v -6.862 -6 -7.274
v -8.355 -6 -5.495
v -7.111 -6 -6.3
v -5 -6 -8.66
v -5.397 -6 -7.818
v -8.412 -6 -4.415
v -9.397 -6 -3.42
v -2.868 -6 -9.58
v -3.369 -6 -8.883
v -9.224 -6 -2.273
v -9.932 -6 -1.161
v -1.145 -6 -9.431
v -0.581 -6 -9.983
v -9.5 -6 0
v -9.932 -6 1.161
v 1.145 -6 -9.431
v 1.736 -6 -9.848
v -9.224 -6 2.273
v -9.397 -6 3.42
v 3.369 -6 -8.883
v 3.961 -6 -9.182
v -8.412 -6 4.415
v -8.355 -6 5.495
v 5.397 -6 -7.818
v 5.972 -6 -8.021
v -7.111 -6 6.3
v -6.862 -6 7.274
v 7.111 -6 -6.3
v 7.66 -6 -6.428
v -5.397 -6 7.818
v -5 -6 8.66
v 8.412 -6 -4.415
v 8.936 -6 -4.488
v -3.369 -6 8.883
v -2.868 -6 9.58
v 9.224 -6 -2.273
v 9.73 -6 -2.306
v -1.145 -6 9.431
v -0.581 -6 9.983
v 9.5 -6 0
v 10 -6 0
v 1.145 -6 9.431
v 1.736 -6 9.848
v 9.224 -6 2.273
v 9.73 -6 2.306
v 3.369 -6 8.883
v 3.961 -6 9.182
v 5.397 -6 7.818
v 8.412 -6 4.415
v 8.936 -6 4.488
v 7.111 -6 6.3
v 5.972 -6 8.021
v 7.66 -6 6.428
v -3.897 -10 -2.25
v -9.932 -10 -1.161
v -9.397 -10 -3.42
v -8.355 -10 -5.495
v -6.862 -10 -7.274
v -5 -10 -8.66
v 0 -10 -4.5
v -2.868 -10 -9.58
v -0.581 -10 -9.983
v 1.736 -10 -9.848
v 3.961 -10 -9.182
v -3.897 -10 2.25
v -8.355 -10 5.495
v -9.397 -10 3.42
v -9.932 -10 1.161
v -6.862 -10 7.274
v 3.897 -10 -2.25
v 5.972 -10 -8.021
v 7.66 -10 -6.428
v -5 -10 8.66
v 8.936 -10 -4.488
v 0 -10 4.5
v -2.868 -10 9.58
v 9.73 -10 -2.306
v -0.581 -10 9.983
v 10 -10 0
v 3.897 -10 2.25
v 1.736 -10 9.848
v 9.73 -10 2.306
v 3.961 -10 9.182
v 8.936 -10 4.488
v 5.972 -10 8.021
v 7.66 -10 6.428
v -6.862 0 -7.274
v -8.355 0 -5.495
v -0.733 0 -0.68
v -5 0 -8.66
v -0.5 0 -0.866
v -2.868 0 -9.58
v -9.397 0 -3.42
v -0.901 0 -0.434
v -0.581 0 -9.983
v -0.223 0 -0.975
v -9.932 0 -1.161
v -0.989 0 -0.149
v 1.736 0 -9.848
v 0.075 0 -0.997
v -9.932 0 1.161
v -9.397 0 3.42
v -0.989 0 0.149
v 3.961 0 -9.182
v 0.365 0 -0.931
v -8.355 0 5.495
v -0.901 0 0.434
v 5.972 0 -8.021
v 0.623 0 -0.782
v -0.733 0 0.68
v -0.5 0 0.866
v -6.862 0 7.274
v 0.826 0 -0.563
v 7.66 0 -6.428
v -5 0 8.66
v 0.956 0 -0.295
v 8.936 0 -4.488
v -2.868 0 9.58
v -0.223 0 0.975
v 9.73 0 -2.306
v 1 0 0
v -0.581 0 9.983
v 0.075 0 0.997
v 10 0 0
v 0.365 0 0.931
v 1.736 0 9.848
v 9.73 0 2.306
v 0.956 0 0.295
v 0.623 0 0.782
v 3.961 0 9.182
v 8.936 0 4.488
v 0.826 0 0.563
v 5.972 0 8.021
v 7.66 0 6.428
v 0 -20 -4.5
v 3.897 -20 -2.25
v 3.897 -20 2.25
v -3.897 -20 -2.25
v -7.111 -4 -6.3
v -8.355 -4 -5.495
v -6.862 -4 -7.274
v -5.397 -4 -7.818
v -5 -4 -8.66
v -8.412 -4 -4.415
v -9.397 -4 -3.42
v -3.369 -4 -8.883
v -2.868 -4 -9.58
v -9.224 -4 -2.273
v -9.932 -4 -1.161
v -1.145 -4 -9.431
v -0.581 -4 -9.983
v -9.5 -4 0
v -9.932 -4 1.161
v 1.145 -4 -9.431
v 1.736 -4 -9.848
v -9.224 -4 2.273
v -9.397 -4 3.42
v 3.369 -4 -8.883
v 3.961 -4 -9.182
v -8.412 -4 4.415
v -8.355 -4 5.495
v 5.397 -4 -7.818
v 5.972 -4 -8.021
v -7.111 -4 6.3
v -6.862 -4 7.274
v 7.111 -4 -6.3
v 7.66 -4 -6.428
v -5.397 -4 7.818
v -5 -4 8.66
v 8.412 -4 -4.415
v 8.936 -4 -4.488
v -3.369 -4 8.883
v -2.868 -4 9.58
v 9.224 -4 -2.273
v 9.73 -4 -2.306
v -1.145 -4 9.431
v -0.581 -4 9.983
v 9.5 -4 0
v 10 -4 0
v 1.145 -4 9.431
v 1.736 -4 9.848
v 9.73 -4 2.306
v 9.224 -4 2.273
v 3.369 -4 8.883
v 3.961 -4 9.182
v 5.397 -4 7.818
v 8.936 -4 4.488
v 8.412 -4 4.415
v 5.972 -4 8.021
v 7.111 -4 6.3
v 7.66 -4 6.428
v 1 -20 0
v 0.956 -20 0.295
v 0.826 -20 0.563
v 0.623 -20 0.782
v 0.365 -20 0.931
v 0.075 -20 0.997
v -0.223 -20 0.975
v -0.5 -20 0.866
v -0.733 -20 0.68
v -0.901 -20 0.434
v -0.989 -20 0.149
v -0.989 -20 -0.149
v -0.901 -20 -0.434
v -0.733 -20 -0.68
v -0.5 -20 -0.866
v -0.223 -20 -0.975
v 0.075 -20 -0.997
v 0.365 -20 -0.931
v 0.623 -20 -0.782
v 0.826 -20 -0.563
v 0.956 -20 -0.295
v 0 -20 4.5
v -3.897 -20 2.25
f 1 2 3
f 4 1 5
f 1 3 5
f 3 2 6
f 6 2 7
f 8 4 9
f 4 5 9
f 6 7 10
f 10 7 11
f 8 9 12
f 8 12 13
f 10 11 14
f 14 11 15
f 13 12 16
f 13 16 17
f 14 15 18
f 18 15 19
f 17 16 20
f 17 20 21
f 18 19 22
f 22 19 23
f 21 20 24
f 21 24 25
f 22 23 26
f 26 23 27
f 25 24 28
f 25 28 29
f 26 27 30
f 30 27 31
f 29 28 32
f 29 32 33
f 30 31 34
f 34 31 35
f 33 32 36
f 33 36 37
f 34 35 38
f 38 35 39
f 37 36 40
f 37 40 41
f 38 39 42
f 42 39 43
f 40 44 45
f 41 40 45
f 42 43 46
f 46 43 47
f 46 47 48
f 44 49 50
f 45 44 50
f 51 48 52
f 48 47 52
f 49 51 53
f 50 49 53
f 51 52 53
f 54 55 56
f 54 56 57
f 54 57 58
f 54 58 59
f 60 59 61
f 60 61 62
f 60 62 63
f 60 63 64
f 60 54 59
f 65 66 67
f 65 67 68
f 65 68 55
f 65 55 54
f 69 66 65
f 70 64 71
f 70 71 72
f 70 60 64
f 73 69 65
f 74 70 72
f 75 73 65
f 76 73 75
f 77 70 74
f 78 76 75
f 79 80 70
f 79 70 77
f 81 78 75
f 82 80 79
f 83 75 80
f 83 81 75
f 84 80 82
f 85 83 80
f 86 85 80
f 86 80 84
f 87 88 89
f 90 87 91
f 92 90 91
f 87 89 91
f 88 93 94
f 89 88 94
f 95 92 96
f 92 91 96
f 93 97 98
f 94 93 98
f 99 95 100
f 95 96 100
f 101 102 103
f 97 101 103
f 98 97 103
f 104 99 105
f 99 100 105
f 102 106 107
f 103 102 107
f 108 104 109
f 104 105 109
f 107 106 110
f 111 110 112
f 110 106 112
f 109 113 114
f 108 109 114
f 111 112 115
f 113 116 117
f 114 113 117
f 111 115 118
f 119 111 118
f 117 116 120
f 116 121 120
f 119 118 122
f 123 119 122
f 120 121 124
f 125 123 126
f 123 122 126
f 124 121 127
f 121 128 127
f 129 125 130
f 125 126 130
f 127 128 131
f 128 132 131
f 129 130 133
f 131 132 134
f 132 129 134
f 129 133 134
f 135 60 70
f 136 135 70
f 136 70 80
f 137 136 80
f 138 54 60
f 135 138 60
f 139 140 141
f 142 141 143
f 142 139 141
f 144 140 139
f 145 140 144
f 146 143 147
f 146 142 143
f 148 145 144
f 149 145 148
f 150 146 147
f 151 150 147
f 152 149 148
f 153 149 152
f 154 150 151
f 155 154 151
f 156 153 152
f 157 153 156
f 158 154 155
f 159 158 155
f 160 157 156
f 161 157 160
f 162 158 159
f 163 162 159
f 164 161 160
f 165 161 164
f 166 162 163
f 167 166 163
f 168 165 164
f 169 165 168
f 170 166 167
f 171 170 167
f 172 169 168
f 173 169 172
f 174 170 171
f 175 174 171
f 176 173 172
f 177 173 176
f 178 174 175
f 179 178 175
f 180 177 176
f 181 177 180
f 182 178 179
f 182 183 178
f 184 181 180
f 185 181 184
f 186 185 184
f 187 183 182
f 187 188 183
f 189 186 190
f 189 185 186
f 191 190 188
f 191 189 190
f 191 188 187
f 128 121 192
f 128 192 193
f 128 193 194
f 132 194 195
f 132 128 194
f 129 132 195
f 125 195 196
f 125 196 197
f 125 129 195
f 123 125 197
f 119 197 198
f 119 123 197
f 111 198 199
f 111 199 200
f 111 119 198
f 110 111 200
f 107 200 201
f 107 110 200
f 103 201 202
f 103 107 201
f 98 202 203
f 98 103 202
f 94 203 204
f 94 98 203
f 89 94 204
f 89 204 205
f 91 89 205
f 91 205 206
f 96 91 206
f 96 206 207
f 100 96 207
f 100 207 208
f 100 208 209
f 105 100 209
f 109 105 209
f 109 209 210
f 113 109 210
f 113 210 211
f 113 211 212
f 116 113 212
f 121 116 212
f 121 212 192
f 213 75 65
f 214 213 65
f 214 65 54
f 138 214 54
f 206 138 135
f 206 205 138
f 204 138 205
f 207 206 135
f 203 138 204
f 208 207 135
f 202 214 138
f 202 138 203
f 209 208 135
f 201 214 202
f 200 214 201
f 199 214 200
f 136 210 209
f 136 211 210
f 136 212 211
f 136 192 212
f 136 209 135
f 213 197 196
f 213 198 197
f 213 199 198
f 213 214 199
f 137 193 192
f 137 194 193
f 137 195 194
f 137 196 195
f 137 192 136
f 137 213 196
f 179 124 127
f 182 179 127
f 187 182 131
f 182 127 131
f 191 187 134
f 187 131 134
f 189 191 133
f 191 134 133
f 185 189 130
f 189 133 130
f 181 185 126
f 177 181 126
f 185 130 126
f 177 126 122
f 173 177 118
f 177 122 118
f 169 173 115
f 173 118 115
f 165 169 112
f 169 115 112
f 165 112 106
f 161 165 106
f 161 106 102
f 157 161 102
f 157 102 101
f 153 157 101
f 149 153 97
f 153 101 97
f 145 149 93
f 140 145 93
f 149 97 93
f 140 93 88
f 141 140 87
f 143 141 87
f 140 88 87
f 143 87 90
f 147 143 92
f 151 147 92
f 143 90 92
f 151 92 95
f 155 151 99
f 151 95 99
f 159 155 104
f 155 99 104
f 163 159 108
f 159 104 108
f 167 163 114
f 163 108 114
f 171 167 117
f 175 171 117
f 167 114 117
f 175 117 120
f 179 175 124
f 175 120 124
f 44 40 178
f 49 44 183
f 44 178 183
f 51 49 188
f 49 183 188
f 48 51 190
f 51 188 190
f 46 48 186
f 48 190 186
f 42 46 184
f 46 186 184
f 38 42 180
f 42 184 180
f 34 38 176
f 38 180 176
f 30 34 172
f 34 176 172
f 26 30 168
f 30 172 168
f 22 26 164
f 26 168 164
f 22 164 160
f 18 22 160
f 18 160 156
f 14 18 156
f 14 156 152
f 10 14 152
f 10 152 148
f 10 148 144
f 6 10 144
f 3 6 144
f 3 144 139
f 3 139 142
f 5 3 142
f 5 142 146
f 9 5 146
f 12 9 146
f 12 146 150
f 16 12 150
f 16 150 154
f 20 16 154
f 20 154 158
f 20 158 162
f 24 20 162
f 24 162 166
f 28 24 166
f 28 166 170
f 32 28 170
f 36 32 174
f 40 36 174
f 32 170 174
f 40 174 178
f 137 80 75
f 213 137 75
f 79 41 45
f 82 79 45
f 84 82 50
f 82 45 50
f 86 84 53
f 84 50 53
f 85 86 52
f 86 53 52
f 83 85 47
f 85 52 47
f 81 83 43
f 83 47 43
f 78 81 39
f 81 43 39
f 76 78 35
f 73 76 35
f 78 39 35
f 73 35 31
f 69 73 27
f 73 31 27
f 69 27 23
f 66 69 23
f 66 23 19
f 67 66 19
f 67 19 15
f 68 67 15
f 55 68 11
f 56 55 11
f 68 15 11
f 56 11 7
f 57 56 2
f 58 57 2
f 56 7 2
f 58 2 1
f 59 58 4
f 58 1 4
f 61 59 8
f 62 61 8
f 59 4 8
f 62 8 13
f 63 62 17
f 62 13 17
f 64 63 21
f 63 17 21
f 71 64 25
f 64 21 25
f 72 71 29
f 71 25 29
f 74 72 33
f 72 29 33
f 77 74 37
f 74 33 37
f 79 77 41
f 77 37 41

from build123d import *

# Parameters (mm, degrees)
F0_R     = 10
F0_R_2   = 9.5
F0_R_3   = 1
F1_DEPTH = 4
F2_DEPTH = 6
F3_R     = 10
F3_R_2   = 9.5
F3_R_3   = 1
F4_DEPTH = 4
F5_DEPTH = 14
F6_DEPTH = 20


with BuildPart() as f1:
    # F0 (on Front) → F1 (new body)
    with BuildSketch(Plane.XZ):
        Circle(F0_R)
        Circle(F0_R_2, mode=Mode.SUBTRACT)
        Circle(F0_R_2)
        with BuildLine():
            ThreePointArc((3.897114317, 2.25), (4.3466662183, 1.164685703), (4.5, 0))
            ThreePointArc((4.5, 0), (4.3466662183, -1.164685703), (3.897114317, -2.25))
            ThreePointArc((3.897114317, -2.25), (2.25, -3.897114317), (0, -4.5))
            ThreePointArc((0, -4.5), (-2.25, -3.897114317), (-3.897114317, -2.25))
            ThreePointArc((-3.897114317, -2.25), (-4.5, 0), (-3.897114317, 2.25))
            ThreePointArc((-3.897114317, 2.25), (-2.25, 3.897114317), (0, 4.5))
            ThreePointArc((0, 4.5), (2.25, 3.897114317), (3.897114317, 2.25))
        make_face(mode=Mode.SUBTRACT)
        with BuildLine():
            Line((0, 4.5), (3.897114317, 2.25))
            ThreePointArc((3.897114317, 2.25), (2.25, 3.897114317), (0, 4.5))
        make_face()
        with BuildLine():
            Line((-3.897114317, 2.25), (0, 4.5))
            ThreePointArc((0, 4.5), (-2.25, 3.897114317), (-3.897114317, 2.25))
        make_face()
        with BuildLine():
            Line((-3.897114317, -2.25), (-3.897114317, 2.25))
            ThreePointArc((-3.897114317, 2.25), (-4.5, 0), (-3.897114317, -2.25))
        make_face()
        with BuildLine():
            ThreePointArc((-3.897114317, -2.25), (-2.25, -3.897114317), (0, -4.5))
            Line((0, -4.5), (-3.897114317, -2.25))
        make_face()
        with BuildLine():
            ThreePointArc((0, -4.5), (2.25, -3.897114317), (3.897114317, -2.25))
            Line((3.897114317, -2.25), (0, -4.5))
        make_face()
        Polygon((3.897114317, -2.25), (3.897114317, 2.25), (0, 4.5), (-3.897114317, 2.25), (-3.897114317, -2.25), (0, -4.5), align=None)
        Circle(F0_R_3, mode=Mode.SUBTRACT)
        with BuildLine():
            ThreePointArc((3.897114317, -2.25), (4.3466662183, -1.164685703), (4.5, 0))
            ThreePointArc((4.5, 0), (4.3466662183, 1.164685703), (3.897114317, 2.25))
            Line((3.897114317, 2.25), (3.897114317, -2.25))
        make_face()
    extrude(amount=F1_DEPTH)

    # F0 (on Front) → F2 (join)
    with BuildSketch(Plane.XZ):
        Circle(F0_R_2)
        with BuildLine():
            ThreePointArc((3.897114317, 2.25), (4.3466662183, 1.164685703), (4.5, 0))
            ThreePointArc((4.5, 0), (4.3466662183, -1.164685703), (3.897114317, -2.25))
            ThreePointArc((3.897114317, -2.25), (2.25, -3.897114317), (0, -4.5))
            ThreePointArc((0, -4.5), (-2.25, -3.897114317), (-3.897114317, -2.25))
            ThreePointArc((-3.897114317, -2.25), (-4.5, 0), (-3.897114317, 2.25))
            ThreePointArc((-3.897114317, 2.25), (-2.25, 3.897114317), (0, 4.5))
            ThreePointArc((0, 4.5), (2.25, 3.897114317), (3.897114317, 2.25))
        make_face(mode=Mode.SUBTRACT)
        Polygon((3.897114317, -2.25), (3.897114317, 2.25), (0, 4.5), (-3.897114317, 2.25), (-3.897114317, -2.25), (0, -4.5), align=None)
        Circle(F0_R_3, mode=Mode.SUBTRACT)
        with BuildLine():
            Line((-3.897114317, 2.25), (0, 4.5))
            ThreePointArc((0, 4.5), (-2.25, 3.897114317), (-3.897114317, 2.25))
        make_face()
        with BuildLine():
            Line((0, 4.5), (3.897114317, 2.25))
            ThreePointArc((3.897114317, 2.25), (2.25, 3.897114317), (0, 4.5))
        make_face()
        with BuildLine():
            ThreePointArc((3.897114317, -2.25), (4.3466662183, -1.164685703), (4.5, 0))
            ThreePointArc((4.5, 0), (4.3466662183, 1.164685703), (3.897114317, 2.25))
            Line((3.897114317, 2.25), (3.897114317, -2.25))
        make_face()
        with BuildLine():
            Line((-3.897114317, -2.25), (-3.897114317, 2.25))
            ThreePointArc((-3.897114317, 2.25), (-4.5, 0), (-3.897114317, -2.25))
        make_face()
        with BuildLine():
            ThreePointArc((-3.897114317, -2.25), (-2.25, -3.897114317), (0, -4.5))
            Line((0, -4.5), (-3.897114317, -2.25))
        make_face()
        with BuildLine():
            ThreePointArc((0, -4.5), (2.25, -3.897114317), (3.897114317, -2.25))
            Line((3.897114317, -2.25), (0, -4.5))
        make_face()
    extrude(amount=F2_DEPTH)



with BuildPart() as f4:
    # F3 (on face) → F4 (new body)
    with BuildSketch(Plane.XZ.offset(6)):
        Circle(F3_R)
        Circle(F3_R_2, mode=Mode.SUBTRACT)
        Circle(F3_R_2)
        with BuildLine():
            ThreePointArc((3.897114317, 2.25), (4.3466662183, 1.164685703), (4.5, 0))
            ThreePointArc((4.5, 0), (4.3466662183, -1.164685703), (3.897114317, -2.25))
            ThreePointArc((3.897114317, -2.25), (2.25, -3.897114317), (0, -4.5))
            ThreePointArc((0, -4.5), (-2.25, -3.897114317), (-3.897114317, -2.25))
            ThreePointArc((-3.897114317, -2.25), (-4.5, 0), (-3.897114317, 2.25))
            ThreePointArc((-3.897114317, 2.25), (-2.25, 3.897114317), (0, 4.5))
            ThreePointArc((0, 4.5), (2.25, 3.897114317), (3.897114317, 2.25))
        make_face(mode=Mode.SUBTRACT)
        with BuildLine():
            Line((-3.897114317, 2.25), (0, 4.5))
            ThreePointArc((0, 4.5), (-2.25, 3.897114317), (-3.897114317, 2.25))
        make_face()
        with BuildLine():
            Line((-3.897114317, -2.25), (-3.897114317, 2.25))
            ThreePointArc((-3.897114317, 2.25), (-4.5, 0), (-3.897114317, -2.25))
        make_face()
        with BuildLine():
            Line((0, 4.5), (3.897114317, 2.25))
            ThreePointArc((3.897114317, 2.25), (2.25, 3.897114317), (0, 4.5))
        make_face()
        Polygon((3.897114317, -2.25), (3.897114317, 2.25), (0, 4.5), (-3.897114317, 2.25), (-3.897114317, -2.25), (0, -4.5), align=None)
        Circle(F3_R_3, mode=Mode.SUBTRACT)
        with BuildLine():
            ThreePointArc((3.897114317, -2.25), (4.3466662183, -1.164685703), (4.5, 0))
            ThreePointArc((4.5, 0), (4.3466662183, 1.164685703), (3.897114317, 2.25))
            Line((3.897114317, 2.25), (3.897114317, -2.25))
        make_face()
        with BuildLine():
            ThreePointArc((0, -4.5), (2.25, -3.897114317), (3.897114317, -2.25))
            Line((3.897114317, -2.25), (0, -4.5))
        make_face()
        with BuildLine():
            ThreePointArc((-3.897114317, -2.25), (-2.25, -3.897114317), (0, -4.5))
            Line((0, -4.5), (-3.897114317, -2.25))
        make_face()
    extrude(amount=F4_DEPTH)


with BuildPart() as f1_1:
    add(f1.part)

    add(f4.part)  # F5 merges F4
    # F3 (on face) → F5 (join)
    with BuildSketch(Plane.XZ.offset(6)):
        Polygon((3.897114317, -2.25), (3.897114317, 2.25), (0, 4.5), (-3.897114317, 2.25), (-3.897114317, -2.25), (0, -4.5), align=None)
        Circle(F3_R_3, mode=Mode.SUBTRACT)
    extrude(amount=F5_DEPTH)

    # F3 (on face) → F6 (cut)
    with BuildSketch(Plane.XZ.offset(6)):
        Circle(F3_R_3)
    extrude(amount=F6_DEPTH, mode=Mode.SUBTRACT)


solid = f1_1.part
